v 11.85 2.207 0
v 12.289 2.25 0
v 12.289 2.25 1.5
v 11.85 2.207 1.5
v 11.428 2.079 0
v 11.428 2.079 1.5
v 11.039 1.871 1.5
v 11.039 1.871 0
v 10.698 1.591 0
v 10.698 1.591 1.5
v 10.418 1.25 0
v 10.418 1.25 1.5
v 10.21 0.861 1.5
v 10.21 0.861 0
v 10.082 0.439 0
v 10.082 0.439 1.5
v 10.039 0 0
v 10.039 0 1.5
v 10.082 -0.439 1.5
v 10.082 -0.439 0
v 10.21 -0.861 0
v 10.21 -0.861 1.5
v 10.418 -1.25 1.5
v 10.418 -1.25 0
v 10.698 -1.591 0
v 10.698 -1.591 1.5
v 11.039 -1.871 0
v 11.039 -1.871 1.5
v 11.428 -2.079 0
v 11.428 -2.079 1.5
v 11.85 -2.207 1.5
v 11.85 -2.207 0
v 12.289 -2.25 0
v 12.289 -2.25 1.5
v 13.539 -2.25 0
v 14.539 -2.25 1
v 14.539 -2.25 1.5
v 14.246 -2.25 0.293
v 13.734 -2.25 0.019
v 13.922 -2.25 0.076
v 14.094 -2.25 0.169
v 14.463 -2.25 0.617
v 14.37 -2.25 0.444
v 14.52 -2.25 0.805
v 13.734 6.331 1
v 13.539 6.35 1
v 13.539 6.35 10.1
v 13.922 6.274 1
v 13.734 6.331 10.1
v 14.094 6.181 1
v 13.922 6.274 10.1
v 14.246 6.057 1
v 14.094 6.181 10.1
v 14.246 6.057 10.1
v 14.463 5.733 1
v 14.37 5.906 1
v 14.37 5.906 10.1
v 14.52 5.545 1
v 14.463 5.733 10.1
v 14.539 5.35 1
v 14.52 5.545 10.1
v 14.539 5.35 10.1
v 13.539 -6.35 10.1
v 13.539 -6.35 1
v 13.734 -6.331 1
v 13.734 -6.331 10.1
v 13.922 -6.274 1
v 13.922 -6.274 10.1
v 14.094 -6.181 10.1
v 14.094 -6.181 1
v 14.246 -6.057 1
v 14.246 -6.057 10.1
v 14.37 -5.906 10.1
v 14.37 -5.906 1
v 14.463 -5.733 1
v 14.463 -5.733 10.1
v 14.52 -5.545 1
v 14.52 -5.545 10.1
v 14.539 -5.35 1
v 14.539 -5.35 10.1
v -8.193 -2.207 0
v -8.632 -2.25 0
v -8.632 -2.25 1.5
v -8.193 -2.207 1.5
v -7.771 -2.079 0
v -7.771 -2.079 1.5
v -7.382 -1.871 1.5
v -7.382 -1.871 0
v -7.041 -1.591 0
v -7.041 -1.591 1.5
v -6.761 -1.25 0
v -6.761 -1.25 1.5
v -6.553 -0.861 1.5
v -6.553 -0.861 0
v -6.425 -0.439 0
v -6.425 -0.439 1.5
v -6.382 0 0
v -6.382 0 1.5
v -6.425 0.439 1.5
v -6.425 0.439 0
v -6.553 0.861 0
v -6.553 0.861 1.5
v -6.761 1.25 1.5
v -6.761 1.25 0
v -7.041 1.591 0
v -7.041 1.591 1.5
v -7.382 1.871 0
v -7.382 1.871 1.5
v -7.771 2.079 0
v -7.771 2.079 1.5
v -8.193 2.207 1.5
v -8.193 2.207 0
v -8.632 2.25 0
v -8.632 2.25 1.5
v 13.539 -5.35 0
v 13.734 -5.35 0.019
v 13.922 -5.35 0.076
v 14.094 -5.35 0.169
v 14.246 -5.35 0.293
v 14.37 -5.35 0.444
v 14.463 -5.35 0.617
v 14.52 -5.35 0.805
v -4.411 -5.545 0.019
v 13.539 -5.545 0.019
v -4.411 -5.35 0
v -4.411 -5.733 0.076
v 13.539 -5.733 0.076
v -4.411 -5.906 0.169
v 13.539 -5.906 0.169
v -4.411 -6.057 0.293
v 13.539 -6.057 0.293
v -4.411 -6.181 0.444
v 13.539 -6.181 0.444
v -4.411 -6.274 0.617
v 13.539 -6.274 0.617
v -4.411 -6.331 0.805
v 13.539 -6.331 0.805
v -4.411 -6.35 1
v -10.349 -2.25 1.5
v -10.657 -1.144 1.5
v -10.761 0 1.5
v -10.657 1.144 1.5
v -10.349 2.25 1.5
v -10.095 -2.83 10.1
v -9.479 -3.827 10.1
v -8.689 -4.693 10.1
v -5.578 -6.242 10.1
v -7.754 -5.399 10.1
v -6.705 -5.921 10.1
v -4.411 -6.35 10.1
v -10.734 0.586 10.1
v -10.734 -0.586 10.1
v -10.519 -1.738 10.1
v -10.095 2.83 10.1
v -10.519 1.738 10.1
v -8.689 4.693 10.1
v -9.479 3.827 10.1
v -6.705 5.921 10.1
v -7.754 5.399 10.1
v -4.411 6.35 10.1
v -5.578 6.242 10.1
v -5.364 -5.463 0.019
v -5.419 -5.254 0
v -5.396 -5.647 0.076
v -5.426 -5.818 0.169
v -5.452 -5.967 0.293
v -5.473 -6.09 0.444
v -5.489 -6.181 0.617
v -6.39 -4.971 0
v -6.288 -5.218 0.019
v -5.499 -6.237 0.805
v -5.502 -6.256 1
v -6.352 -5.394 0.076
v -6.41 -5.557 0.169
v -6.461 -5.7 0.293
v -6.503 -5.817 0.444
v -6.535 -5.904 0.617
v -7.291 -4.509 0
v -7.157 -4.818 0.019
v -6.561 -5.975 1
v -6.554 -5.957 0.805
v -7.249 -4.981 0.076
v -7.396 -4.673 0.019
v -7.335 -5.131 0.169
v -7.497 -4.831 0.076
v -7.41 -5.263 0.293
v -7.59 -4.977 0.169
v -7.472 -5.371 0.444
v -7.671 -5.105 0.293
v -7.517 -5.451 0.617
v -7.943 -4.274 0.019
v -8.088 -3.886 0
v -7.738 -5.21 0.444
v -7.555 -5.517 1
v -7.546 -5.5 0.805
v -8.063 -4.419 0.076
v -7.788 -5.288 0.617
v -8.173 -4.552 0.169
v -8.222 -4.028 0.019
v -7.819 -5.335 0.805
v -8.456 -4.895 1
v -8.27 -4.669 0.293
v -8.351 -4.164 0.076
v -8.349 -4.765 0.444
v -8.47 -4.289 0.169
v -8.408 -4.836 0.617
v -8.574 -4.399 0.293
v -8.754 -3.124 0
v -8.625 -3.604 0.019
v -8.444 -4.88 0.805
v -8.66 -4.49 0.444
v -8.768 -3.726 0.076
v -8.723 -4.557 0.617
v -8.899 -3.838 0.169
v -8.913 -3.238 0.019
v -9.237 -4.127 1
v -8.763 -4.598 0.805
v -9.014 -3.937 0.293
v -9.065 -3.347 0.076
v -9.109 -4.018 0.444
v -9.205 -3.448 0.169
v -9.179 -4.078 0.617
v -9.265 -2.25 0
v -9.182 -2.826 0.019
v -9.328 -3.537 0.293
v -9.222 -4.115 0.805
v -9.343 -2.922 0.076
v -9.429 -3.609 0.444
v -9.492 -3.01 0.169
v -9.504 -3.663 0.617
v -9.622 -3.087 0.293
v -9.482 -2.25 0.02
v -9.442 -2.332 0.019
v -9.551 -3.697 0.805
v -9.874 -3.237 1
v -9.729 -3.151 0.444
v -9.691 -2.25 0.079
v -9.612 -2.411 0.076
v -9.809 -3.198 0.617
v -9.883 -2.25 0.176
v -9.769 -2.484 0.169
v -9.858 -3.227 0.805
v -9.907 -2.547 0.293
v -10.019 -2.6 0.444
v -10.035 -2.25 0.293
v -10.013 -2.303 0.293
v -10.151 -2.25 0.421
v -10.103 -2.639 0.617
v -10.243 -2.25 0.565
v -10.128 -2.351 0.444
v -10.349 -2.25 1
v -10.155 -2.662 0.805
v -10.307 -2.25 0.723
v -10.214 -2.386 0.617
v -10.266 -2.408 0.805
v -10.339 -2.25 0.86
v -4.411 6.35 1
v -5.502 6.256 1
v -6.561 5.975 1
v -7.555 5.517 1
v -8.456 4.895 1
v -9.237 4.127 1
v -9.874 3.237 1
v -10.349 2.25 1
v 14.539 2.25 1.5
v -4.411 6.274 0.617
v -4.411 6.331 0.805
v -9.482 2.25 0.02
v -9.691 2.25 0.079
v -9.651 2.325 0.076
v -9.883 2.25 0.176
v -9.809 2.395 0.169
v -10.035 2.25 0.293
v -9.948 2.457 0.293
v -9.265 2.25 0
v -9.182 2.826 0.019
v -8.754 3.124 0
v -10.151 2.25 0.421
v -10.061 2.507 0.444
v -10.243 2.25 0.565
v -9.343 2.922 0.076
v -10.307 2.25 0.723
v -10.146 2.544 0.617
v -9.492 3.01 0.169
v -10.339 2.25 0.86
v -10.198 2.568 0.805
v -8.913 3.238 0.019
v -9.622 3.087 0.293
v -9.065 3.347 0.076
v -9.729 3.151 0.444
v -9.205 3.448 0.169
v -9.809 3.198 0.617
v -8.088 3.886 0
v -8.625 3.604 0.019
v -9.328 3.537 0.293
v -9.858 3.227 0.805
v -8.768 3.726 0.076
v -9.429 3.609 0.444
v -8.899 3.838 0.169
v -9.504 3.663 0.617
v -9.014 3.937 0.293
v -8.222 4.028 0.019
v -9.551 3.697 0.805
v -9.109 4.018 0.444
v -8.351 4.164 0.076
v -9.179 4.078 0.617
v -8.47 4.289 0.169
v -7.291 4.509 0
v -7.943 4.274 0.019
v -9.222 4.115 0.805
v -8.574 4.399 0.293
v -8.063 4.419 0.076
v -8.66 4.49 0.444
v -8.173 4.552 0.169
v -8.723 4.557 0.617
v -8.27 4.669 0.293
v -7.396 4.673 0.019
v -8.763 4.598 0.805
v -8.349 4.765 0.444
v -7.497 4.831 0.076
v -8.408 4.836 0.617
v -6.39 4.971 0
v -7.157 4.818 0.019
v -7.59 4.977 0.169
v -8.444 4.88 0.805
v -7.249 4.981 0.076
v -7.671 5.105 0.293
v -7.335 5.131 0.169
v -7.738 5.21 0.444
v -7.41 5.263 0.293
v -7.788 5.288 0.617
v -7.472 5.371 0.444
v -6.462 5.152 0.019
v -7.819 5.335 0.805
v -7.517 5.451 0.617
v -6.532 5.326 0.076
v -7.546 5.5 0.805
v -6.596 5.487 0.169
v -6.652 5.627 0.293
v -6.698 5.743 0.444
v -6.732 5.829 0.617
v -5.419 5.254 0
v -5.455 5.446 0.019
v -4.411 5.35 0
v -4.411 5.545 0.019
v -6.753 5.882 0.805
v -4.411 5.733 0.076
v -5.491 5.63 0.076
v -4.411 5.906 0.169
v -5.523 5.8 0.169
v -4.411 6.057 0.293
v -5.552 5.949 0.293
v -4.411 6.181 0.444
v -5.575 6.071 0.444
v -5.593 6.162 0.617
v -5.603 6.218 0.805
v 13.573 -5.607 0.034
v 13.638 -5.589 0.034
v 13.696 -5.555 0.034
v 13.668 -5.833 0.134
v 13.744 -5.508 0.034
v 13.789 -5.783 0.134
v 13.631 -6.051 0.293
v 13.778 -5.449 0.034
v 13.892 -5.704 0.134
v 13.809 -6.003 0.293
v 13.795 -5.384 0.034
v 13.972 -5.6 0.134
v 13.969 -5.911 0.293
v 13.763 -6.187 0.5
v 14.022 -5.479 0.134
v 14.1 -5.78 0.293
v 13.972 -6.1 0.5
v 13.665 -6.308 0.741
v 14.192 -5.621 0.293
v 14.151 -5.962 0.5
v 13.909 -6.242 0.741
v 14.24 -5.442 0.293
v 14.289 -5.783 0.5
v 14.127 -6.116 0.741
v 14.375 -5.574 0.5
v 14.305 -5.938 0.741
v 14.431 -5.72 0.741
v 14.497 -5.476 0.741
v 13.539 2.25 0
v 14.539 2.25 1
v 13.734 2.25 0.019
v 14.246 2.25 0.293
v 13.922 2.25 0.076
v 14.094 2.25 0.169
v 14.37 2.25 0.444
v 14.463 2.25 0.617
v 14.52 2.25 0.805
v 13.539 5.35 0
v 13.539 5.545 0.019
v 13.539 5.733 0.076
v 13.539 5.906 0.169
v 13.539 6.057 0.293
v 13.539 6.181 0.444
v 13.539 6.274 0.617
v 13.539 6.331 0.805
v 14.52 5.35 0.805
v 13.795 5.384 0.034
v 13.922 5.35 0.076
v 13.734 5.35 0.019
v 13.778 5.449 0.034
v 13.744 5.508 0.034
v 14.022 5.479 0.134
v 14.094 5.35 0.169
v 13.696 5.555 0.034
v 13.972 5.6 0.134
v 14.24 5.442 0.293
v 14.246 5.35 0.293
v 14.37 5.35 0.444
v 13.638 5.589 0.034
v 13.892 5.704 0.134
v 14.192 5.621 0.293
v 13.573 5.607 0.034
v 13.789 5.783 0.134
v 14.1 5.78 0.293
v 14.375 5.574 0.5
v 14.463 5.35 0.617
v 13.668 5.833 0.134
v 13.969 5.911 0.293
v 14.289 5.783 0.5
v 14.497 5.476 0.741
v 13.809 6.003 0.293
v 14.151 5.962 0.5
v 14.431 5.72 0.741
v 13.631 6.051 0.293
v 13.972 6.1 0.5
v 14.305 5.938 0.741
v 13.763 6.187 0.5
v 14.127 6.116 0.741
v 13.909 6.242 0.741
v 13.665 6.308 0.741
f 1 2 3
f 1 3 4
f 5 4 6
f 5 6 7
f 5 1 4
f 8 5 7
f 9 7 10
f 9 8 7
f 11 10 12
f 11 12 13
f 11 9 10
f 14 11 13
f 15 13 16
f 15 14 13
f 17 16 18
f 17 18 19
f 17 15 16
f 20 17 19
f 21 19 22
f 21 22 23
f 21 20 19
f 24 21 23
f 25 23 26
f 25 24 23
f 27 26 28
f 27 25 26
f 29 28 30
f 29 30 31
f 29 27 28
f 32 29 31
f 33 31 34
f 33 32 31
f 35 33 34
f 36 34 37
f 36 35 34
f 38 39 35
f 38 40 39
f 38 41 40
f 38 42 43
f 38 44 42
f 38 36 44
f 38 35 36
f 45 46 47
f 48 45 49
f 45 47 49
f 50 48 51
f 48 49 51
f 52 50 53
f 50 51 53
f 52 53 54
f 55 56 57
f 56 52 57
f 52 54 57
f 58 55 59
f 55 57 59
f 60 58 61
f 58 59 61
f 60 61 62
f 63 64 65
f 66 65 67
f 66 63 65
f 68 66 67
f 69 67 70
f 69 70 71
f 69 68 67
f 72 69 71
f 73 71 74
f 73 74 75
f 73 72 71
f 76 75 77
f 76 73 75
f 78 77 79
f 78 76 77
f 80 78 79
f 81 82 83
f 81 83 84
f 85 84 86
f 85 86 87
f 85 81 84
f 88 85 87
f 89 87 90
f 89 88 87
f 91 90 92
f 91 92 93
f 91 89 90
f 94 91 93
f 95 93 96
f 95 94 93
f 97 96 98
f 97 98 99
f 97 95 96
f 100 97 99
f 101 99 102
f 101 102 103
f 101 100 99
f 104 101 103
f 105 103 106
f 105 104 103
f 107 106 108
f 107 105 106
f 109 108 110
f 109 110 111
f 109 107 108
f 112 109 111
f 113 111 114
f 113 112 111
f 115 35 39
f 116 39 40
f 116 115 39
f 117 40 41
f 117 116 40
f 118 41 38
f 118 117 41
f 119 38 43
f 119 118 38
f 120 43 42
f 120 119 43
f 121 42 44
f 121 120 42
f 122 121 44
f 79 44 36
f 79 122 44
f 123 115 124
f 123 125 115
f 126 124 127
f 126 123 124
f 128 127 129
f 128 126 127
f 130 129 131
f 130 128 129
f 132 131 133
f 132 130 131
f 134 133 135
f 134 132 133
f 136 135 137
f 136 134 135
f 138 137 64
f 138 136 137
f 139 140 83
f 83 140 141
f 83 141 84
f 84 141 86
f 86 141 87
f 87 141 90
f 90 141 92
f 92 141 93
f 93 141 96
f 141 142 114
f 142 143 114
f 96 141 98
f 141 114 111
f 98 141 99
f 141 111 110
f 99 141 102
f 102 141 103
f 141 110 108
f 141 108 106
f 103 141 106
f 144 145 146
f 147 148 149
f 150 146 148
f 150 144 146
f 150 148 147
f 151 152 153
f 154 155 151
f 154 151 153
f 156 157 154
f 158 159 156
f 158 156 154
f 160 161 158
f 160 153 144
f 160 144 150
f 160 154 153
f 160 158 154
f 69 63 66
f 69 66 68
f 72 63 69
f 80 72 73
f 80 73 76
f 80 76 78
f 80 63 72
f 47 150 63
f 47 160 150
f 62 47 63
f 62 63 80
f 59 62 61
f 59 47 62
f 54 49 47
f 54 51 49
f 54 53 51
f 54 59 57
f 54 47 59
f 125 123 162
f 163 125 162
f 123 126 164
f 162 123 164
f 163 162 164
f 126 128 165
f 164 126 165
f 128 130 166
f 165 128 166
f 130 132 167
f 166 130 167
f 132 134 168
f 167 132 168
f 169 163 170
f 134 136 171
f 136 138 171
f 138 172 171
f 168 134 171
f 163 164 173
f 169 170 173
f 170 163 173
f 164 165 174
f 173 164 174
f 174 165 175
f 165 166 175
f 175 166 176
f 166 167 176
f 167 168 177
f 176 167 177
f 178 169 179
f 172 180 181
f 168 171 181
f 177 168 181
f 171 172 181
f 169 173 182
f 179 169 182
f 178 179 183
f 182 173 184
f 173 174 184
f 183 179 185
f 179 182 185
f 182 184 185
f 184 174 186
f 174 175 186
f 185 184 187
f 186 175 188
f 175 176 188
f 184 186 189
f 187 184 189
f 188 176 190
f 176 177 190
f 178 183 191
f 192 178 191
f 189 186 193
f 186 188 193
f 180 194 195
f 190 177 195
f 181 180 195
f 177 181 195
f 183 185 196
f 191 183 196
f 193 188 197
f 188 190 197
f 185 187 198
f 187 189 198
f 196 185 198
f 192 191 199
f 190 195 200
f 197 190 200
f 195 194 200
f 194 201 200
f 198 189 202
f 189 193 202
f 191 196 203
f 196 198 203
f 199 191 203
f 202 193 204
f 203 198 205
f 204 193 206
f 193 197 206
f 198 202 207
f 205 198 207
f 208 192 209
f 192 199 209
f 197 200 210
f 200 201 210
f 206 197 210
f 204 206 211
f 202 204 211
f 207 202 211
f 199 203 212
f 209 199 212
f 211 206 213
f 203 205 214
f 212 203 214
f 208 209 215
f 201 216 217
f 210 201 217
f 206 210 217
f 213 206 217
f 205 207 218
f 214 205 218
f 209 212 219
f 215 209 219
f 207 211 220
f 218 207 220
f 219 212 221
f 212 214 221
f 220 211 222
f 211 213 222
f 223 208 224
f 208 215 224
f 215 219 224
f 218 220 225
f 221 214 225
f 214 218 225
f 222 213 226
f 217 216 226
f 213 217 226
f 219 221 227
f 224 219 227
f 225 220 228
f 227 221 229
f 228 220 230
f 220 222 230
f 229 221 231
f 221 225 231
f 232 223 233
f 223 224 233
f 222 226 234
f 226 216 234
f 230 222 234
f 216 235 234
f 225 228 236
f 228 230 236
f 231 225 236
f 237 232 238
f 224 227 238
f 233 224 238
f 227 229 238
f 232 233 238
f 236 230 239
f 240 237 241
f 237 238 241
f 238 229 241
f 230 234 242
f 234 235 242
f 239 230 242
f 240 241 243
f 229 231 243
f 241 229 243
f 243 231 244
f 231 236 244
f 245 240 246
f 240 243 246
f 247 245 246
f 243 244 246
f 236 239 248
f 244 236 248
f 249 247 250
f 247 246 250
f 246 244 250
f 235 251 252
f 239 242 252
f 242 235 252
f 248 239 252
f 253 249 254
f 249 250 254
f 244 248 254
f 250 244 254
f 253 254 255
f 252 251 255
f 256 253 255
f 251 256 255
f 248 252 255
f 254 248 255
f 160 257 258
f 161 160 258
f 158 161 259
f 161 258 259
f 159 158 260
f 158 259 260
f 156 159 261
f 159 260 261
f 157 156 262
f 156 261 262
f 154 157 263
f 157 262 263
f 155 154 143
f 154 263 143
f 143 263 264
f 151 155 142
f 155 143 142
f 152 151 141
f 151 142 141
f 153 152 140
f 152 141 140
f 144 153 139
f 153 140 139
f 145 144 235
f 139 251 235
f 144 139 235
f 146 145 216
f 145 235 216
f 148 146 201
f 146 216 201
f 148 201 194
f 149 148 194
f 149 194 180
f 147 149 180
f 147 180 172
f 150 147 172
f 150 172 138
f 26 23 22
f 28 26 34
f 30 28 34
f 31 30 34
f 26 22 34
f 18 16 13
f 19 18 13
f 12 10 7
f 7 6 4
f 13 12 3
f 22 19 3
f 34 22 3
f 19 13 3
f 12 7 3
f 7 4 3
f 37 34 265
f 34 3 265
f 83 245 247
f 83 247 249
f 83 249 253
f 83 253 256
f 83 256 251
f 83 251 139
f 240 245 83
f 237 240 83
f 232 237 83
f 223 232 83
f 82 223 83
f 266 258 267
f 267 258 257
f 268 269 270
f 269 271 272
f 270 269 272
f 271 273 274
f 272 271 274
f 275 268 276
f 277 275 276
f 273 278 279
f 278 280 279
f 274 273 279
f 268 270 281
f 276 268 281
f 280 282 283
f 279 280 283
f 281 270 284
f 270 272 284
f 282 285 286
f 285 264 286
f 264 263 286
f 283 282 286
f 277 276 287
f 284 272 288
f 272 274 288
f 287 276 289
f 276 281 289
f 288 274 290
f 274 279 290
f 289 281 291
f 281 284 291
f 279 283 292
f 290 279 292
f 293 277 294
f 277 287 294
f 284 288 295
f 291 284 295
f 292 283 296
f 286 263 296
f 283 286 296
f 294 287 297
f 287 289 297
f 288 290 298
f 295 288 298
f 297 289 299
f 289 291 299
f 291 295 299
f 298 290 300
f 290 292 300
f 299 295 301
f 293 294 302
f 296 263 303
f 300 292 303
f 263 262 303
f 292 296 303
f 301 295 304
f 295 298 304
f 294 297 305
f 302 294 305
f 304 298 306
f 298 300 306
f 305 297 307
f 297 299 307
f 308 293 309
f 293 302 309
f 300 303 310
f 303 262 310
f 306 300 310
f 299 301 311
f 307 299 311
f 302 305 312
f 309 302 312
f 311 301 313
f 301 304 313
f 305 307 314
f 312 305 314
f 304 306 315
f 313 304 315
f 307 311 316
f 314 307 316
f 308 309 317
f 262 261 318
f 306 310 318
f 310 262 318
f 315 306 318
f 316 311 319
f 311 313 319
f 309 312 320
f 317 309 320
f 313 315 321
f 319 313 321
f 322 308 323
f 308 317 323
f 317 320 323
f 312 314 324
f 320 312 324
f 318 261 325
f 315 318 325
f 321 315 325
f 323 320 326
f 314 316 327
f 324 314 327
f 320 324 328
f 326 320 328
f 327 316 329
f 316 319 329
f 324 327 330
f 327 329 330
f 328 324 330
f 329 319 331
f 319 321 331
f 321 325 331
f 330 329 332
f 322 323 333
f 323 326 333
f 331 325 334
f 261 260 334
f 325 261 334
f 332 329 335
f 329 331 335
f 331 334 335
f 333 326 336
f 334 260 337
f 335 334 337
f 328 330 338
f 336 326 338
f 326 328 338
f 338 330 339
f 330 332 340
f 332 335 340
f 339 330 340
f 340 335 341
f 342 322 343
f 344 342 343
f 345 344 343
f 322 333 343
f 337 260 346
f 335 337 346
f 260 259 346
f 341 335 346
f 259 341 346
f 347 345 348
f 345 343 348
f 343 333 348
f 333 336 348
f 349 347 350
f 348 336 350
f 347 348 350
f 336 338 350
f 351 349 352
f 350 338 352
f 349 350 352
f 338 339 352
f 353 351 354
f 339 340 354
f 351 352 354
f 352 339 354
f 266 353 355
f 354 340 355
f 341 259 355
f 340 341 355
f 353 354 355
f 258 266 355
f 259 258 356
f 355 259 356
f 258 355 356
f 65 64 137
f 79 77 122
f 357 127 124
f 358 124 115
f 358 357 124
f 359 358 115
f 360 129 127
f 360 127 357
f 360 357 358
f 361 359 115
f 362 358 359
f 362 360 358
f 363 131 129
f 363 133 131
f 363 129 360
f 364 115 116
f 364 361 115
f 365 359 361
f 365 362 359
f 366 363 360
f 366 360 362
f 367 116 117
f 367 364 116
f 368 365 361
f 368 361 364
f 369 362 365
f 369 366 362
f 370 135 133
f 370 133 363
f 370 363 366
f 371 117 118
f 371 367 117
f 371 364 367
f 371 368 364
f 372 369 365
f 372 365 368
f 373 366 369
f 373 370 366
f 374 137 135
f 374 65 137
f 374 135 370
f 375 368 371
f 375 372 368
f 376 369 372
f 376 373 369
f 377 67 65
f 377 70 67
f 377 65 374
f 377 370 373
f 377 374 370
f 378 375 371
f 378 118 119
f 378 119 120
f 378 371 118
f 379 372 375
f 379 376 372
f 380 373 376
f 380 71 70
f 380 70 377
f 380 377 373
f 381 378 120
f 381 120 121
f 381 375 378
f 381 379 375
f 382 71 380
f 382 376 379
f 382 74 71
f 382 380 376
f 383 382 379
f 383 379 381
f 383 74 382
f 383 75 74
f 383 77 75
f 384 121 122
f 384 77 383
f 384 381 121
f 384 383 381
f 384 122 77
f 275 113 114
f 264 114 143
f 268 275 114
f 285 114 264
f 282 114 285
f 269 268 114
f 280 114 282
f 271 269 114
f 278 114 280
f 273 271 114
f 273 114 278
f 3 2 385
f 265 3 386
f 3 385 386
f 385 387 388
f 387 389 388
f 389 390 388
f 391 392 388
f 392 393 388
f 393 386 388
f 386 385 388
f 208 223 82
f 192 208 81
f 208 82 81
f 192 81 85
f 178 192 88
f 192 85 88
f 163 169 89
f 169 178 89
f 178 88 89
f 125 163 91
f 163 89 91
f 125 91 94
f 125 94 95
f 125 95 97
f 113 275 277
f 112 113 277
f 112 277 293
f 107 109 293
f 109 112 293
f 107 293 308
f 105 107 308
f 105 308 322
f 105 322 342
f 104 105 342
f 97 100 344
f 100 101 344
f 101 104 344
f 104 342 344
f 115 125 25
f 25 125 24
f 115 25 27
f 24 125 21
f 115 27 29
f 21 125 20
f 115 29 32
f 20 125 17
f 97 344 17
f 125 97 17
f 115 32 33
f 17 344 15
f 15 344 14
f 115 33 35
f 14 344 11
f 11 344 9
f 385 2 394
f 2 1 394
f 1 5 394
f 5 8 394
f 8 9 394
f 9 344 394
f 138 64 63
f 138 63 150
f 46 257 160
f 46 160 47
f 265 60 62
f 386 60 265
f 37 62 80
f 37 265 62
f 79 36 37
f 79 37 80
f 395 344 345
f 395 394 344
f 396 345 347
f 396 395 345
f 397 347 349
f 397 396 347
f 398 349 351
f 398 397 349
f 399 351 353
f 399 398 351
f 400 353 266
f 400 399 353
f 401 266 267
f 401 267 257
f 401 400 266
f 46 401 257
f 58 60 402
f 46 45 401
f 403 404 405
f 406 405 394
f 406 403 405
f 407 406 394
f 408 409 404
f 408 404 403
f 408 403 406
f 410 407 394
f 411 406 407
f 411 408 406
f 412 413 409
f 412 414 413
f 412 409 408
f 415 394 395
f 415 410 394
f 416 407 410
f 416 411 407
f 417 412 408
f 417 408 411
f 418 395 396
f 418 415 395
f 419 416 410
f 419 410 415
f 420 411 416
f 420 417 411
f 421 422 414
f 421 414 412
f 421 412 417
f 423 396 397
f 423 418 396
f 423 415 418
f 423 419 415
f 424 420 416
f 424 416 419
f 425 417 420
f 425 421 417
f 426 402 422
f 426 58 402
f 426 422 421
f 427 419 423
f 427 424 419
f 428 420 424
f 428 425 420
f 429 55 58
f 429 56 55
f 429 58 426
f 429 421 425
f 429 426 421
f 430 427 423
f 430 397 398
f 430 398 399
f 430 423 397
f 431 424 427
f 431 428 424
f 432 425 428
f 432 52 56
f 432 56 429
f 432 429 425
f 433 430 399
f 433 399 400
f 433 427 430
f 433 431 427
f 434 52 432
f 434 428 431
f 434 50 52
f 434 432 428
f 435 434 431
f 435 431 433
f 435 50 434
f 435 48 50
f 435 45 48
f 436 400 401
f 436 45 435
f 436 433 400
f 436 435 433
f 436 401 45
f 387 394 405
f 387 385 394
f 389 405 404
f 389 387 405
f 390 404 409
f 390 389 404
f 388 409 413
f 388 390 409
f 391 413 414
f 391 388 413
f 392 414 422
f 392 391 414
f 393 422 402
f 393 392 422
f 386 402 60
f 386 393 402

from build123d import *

# Parameters (mm, degrees)
PAD_DEPTH       = 10.1
POCKET_DEPTH    = 1.5
POCKET001_DEPTH = 1.5
FILLET003_R     = 1


with BuildPart() as part:
    # Sketch → Pad (new body)
    with BuildSketch(Plane.XY):
        with BuildLine():
            ThreePointArc((-4.411122, 6.35), (-10.761122, 0), (-4.411122, -6.35))
            Line((14.538878, -6.35), (-4.411122, -6.35))
            Line((14.538878, 6.35), (14.538878, -6.35))
            Line((-4.411122, 6.35), (14.538878, 6.35))
        make_face()
    extrude(amount=PAD_DEPTH)

    # Sketch003 → Pocket (cut)
    with BuildSketch(Plane.XY):
        with BuildLine():
            ThreePointArc((12.288878, 2.25), (10.038878, 0), (12.288878, -2.25))
            Line((12.288878, -2.25), (14.538878, -2.25))
            Line((14.538878, 2.25), (14.538878, -2.25))
            Line((12.288878, 2.25), (14.538878, 2.25))
        make_face()
    extrude(amount=POCKET_DEPTH, mode=Mode.SUBTRACT)

    # Sketch004 → Pocket001 (cut)
    with BuildSketch(Plane.XY):
        with BuildLine():
            ThreePointArc((-8.632006, -2.25), (-6.382006, 0), (-8.632006, 2.25))
            Line((-8.632006, 2.25), (-10.882006, 2.25))
            Line((-10.882006, 2.25), (-10.882006, -2.25))
            Line((-10.882006, -2.25), (-8.632006, -2.25))
        make_face()
    extrude(amount=POCKET001_DEPTH, mode=Mode.SUBTRACT)

    # Fillet003
    fillet003_edges = [part.edges().sort_by_distance(p)[0] for p in [
        (14.538878, -6.35, 5.05),
        (14.538878, 6.35, 5.05),
        (5.063878, -6.35, 0),
        (14.538878, -4.3, 0),
        (14.538878, 4.3, 0),
        (5.063878, 6.35, 0),
        (-8.019099, 5.225419, 0),
        (-8.019099, -5.225419, 0),
    ]]
    fillet(fillet003_edges, radius=FILLET003_R)


solid = part.part
